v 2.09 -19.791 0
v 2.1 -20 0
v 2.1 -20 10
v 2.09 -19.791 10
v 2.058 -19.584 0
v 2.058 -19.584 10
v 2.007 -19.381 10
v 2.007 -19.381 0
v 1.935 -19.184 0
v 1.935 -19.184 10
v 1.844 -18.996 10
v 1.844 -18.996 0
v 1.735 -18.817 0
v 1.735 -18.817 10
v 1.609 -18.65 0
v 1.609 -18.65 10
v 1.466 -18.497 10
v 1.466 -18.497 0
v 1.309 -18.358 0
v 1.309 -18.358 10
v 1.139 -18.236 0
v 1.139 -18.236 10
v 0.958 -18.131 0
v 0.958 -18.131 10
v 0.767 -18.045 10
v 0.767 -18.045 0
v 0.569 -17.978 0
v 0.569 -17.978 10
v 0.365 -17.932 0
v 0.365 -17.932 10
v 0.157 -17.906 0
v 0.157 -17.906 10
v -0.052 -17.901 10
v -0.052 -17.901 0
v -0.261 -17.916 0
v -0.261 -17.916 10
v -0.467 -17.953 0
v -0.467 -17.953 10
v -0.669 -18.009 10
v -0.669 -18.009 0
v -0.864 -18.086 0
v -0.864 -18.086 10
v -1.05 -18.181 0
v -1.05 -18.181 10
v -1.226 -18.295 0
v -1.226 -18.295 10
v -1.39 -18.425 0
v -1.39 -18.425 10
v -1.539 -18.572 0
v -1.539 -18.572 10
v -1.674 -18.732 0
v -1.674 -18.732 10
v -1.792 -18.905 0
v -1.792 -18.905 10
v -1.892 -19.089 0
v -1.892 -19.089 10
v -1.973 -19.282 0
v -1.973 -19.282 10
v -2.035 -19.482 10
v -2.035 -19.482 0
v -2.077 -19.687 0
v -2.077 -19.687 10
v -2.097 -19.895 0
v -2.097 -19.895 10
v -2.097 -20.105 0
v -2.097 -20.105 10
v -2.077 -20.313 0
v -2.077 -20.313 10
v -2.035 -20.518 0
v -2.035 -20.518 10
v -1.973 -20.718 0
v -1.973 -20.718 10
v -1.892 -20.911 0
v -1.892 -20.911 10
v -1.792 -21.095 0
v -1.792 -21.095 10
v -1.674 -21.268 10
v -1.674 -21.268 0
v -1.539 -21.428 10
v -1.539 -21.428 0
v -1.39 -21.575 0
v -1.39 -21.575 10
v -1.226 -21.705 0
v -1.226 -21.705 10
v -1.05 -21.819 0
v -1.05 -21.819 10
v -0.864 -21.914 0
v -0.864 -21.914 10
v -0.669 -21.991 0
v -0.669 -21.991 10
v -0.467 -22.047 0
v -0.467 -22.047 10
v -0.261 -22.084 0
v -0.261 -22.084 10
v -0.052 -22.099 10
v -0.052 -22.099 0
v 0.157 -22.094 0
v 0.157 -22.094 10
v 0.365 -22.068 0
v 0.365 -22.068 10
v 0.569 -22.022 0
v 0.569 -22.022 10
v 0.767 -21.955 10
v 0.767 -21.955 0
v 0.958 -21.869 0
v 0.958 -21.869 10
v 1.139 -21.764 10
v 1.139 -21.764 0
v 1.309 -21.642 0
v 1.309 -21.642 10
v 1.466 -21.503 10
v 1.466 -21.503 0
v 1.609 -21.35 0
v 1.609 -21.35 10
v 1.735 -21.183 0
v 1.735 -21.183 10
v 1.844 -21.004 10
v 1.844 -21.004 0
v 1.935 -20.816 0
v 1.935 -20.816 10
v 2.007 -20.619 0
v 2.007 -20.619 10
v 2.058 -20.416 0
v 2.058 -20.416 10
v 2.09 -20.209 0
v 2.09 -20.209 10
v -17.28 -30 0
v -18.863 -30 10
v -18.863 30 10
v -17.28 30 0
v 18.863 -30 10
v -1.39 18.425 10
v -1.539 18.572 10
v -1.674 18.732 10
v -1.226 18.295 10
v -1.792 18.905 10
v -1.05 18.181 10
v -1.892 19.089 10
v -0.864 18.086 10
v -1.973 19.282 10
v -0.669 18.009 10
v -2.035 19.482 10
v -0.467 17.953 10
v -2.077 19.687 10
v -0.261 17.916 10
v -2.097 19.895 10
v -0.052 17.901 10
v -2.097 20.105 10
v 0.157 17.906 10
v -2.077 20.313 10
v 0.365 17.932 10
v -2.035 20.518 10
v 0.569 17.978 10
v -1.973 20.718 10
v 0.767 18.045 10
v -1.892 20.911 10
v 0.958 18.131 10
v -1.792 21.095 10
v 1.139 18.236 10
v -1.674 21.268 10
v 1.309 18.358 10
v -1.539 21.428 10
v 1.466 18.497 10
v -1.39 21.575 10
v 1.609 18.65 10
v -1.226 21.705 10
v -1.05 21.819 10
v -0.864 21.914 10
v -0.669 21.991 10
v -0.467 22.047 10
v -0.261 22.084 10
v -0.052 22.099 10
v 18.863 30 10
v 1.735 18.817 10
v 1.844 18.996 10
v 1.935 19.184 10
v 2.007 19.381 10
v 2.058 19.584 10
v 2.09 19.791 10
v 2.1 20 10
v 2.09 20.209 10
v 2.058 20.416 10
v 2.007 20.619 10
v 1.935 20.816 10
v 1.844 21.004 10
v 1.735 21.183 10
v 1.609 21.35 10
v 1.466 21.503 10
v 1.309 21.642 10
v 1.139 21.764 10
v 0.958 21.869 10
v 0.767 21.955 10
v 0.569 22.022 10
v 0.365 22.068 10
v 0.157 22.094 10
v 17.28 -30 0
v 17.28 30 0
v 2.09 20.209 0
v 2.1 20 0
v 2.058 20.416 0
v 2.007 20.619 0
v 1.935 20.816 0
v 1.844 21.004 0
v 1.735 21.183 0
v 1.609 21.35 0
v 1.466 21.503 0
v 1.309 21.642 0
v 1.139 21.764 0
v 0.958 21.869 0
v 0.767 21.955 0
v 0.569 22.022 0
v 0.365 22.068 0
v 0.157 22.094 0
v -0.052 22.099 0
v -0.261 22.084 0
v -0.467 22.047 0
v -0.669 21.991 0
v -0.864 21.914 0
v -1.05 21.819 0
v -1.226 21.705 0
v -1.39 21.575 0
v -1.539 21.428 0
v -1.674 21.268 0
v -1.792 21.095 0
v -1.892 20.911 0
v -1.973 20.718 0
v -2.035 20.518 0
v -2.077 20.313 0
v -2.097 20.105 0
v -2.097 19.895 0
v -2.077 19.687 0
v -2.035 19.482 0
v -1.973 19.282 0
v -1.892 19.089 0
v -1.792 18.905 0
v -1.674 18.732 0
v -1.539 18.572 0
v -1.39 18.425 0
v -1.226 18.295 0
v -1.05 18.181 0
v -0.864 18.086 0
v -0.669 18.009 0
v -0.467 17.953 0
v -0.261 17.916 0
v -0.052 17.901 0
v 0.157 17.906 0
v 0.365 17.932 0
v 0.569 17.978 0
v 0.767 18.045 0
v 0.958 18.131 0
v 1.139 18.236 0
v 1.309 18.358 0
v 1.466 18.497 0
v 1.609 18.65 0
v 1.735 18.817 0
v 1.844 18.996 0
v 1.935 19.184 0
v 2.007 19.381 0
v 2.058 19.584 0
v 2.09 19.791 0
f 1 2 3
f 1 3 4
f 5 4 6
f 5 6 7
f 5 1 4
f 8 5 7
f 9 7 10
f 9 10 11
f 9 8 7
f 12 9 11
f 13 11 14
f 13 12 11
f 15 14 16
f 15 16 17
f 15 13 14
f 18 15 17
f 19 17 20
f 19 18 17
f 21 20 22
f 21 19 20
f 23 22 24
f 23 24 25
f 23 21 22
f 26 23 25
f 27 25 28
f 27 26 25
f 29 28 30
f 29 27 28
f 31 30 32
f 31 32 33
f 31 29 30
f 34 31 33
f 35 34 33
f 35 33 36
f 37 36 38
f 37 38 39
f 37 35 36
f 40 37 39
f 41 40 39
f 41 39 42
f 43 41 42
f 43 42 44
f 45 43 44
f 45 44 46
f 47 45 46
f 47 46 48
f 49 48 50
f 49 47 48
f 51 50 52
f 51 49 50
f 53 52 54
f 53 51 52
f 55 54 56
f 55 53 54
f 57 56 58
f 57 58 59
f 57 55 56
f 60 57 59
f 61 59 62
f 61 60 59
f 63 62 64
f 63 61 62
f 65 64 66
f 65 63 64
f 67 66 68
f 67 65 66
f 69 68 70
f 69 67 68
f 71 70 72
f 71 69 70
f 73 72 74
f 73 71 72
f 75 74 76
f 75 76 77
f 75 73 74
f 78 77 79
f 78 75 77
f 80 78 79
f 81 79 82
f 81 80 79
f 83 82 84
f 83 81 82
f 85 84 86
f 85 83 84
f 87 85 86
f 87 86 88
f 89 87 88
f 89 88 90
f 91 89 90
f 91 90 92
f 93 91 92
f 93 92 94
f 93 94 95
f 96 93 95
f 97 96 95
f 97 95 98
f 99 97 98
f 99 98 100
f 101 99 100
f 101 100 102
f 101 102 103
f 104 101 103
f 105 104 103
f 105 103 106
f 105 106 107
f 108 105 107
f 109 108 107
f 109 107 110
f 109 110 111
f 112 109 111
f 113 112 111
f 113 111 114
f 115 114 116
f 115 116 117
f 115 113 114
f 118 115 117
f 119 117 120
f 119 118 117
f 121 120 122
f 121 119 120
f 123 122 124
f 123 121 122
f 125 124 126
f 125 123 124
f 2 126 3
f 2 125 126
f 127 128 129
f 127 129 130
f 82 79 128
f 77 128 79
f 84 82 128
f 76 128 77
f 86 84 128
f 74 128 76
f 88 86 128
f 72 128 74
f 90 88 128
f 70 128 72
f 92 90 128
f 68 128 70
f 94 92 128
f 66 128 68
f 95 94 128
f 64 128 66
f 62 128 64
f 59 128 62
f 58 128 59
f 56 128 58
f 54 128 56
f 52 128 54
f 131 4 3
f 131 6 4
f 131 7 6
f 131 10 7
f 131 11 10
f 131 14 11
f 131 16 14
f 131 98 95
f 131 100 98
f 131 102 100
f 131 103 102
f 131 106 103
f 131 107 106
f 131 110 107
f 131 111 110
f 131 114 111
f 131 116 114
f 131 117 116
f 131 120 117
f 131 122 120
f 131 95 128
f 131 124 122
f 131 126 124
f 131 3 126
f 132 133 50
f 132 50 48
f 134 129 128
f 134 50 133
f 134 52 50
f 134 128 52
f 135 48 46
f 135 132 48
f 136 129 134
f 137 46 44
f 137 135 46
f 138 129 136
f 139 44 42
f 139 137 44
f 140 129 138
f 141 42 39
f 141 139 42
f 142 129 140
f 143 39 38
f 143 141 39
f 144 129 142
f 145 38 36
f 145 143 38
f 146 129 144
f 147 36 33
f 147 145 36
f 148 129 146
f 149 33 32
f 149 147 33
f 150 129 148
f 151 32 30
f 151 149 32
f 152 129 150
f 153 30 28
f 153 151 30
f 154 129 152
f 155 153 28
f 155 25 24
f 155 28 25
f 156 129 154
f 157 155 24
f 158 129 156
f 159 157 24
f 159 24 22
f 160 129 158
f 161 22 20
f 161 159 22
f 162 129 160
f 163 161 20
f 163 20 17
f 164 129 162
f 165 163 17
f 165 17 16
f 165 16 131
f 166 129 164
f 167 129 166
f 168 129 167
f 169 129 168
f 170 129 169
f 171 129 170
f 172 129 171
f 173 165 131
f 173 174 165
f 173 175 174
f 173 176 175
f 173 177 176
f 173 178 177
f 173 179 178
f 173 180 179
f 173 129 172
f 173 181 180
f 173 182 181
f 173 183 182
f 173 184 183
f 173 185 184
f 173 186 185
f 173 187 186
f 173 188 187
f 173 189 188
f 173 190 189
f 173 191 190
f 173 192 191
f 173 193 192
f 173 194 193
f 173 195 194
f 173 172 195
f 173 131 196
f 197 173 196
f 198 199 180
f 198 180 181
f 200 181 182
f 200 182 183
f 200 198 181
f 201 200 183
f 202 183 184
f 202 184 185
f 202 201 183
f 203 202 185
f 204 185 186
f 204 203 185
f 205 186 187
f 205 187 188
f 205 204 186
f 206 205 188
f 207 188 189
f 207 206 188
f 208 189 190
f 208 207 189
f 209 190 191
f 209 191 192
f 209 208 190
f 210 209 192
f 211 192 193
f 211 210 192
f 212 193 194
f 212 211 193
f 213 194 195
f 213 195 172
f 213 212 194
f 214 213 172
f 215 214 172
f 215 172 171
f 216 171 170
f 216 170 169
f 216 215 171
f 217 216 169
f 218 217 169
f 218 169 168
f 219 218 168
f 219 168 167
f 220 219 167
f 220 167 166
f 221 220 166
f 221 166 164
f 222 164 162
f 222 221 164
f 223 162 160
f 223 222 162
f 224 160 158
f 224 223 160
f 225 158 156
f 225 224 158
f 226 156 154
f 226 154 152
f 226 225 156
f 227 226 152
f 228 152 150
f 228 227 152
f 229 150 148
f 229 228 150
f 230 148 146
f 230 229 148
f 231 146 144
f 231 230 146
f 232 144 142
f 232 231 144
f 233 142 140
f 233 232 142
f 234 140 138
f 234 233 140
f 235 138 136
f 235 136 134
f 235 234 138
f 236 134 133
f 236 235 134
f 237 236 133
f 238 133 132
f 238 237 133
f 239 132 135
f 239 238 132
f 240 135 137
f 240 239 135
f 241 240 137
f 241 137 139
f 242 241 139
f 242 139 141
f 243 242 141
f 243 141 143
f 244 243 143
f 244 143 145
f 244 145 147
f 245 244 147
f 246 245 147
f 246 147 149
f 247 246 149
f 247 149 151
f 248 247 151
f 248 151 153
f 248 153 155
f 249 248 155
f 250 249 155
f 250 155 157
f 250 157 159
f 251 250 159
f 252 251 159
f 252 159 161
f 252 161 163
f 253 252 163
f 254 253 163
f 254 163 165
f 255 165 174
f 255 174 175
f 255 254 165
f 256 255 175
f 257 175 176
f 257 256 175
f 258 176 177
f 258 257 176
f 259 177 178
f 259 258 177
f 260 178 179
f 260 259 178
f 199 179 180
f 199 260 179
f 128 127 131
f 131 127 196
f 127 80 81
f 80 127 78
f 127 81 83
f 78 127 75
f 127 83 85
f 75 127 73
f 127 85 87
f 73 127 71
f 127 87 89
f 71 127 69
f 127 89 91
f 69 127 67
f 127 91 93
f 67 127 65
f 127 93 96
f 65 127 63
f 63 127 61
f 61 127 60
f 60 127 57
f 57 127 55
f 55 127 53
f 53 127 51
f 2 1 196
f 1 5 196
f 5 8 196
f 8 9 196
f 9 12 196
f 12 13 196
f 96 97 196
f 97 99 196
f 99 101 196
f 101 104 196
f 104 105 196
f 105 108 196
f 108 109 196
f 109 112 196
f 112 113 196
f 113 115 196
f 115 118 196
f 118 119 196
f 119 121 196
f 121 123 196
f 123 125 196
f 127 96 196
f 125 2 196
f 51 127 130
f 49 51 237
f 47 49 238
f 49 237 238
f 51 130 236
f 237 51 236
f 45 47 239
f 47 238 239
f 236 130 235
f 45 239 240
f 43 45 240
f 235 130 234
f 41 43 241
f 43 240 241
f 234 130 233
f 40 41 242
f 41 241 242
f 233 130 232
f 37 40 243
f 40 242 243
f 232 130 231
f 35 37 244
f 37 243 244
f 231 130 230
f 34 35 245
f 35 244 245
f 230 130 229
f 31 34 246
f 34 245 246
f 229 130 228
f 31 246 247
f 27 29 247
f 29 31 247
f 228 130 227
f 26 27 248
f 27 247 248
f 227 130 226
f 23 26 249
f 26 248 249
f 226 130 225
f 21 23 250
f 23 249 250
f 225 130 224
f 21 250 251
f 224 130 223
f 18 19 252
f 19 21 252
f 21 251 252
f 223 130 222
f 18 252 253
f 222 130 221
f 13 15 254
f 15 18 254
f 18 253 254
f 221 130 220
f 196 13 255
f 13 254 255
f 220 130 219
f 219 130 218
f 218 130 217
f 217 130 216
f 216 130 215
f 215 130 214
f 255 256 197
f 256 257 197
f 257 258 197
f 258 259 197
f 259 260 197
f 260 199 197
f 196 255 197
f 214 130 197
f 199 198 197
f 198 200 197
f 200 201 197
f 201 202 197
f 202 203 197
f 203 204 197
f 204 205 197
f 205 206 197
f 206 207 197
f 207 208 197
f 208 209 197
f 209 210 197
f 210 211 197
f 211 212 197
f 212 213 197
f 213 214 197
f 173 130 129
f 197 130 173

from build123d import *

# Parameters (mm, degrees)
IZIM1_W                     = 43.801650212
IZIM1_H                     = 60
IZIM1_R                     = 2.1
Y_KSEKLIK_EKSTR_ZYON1_DEPTH = 10
KES_EKSTR_ZYON1_DEPTH       = 81


with BuildPart() as part:
    # Çizim1 → Yükseklik-Ekstrüzyon1 (new body)
    with BuildSketch(Plane.XY):
        Rectangle(IZIM1_W, IZIM1_H)
        with Locations((0, -20)):
            Circle(IZIM1_R, mode=Mode.SUBTRACT)
        with Locations((0, 20)):
            Circle(IZIM1_R, mode=Mode.SUBTRACT)
    extrude(amount=Y_KSEKLIK_EKSTR_ZYON1_DEPTH)

    # Çizim2 → Kes-Ekstrüzyon1 (cut)
    with BuildSketch(Plane(origin=(0, 30, 0), x_dir=(1, 0, 0), z_dir=(0, 1, 0))):
        Polygon((-15.608960187, 10.547911998), (-27.517863297, 10.547911998), (-27.517863297, -12.148896601), (-18.937760084, -10.469303395), align=None)
        Polygon((27.517863297, -12.148896601), (18.937760084, -10.469303395), (15.608960187, 10.547911998), (27.517863297, 10.547911998), align=None)
    extrude(amount=-KES_EKSTR_ZYON1_DEPTH, mode=Mode.SUBTRACT)


solid = part.part
